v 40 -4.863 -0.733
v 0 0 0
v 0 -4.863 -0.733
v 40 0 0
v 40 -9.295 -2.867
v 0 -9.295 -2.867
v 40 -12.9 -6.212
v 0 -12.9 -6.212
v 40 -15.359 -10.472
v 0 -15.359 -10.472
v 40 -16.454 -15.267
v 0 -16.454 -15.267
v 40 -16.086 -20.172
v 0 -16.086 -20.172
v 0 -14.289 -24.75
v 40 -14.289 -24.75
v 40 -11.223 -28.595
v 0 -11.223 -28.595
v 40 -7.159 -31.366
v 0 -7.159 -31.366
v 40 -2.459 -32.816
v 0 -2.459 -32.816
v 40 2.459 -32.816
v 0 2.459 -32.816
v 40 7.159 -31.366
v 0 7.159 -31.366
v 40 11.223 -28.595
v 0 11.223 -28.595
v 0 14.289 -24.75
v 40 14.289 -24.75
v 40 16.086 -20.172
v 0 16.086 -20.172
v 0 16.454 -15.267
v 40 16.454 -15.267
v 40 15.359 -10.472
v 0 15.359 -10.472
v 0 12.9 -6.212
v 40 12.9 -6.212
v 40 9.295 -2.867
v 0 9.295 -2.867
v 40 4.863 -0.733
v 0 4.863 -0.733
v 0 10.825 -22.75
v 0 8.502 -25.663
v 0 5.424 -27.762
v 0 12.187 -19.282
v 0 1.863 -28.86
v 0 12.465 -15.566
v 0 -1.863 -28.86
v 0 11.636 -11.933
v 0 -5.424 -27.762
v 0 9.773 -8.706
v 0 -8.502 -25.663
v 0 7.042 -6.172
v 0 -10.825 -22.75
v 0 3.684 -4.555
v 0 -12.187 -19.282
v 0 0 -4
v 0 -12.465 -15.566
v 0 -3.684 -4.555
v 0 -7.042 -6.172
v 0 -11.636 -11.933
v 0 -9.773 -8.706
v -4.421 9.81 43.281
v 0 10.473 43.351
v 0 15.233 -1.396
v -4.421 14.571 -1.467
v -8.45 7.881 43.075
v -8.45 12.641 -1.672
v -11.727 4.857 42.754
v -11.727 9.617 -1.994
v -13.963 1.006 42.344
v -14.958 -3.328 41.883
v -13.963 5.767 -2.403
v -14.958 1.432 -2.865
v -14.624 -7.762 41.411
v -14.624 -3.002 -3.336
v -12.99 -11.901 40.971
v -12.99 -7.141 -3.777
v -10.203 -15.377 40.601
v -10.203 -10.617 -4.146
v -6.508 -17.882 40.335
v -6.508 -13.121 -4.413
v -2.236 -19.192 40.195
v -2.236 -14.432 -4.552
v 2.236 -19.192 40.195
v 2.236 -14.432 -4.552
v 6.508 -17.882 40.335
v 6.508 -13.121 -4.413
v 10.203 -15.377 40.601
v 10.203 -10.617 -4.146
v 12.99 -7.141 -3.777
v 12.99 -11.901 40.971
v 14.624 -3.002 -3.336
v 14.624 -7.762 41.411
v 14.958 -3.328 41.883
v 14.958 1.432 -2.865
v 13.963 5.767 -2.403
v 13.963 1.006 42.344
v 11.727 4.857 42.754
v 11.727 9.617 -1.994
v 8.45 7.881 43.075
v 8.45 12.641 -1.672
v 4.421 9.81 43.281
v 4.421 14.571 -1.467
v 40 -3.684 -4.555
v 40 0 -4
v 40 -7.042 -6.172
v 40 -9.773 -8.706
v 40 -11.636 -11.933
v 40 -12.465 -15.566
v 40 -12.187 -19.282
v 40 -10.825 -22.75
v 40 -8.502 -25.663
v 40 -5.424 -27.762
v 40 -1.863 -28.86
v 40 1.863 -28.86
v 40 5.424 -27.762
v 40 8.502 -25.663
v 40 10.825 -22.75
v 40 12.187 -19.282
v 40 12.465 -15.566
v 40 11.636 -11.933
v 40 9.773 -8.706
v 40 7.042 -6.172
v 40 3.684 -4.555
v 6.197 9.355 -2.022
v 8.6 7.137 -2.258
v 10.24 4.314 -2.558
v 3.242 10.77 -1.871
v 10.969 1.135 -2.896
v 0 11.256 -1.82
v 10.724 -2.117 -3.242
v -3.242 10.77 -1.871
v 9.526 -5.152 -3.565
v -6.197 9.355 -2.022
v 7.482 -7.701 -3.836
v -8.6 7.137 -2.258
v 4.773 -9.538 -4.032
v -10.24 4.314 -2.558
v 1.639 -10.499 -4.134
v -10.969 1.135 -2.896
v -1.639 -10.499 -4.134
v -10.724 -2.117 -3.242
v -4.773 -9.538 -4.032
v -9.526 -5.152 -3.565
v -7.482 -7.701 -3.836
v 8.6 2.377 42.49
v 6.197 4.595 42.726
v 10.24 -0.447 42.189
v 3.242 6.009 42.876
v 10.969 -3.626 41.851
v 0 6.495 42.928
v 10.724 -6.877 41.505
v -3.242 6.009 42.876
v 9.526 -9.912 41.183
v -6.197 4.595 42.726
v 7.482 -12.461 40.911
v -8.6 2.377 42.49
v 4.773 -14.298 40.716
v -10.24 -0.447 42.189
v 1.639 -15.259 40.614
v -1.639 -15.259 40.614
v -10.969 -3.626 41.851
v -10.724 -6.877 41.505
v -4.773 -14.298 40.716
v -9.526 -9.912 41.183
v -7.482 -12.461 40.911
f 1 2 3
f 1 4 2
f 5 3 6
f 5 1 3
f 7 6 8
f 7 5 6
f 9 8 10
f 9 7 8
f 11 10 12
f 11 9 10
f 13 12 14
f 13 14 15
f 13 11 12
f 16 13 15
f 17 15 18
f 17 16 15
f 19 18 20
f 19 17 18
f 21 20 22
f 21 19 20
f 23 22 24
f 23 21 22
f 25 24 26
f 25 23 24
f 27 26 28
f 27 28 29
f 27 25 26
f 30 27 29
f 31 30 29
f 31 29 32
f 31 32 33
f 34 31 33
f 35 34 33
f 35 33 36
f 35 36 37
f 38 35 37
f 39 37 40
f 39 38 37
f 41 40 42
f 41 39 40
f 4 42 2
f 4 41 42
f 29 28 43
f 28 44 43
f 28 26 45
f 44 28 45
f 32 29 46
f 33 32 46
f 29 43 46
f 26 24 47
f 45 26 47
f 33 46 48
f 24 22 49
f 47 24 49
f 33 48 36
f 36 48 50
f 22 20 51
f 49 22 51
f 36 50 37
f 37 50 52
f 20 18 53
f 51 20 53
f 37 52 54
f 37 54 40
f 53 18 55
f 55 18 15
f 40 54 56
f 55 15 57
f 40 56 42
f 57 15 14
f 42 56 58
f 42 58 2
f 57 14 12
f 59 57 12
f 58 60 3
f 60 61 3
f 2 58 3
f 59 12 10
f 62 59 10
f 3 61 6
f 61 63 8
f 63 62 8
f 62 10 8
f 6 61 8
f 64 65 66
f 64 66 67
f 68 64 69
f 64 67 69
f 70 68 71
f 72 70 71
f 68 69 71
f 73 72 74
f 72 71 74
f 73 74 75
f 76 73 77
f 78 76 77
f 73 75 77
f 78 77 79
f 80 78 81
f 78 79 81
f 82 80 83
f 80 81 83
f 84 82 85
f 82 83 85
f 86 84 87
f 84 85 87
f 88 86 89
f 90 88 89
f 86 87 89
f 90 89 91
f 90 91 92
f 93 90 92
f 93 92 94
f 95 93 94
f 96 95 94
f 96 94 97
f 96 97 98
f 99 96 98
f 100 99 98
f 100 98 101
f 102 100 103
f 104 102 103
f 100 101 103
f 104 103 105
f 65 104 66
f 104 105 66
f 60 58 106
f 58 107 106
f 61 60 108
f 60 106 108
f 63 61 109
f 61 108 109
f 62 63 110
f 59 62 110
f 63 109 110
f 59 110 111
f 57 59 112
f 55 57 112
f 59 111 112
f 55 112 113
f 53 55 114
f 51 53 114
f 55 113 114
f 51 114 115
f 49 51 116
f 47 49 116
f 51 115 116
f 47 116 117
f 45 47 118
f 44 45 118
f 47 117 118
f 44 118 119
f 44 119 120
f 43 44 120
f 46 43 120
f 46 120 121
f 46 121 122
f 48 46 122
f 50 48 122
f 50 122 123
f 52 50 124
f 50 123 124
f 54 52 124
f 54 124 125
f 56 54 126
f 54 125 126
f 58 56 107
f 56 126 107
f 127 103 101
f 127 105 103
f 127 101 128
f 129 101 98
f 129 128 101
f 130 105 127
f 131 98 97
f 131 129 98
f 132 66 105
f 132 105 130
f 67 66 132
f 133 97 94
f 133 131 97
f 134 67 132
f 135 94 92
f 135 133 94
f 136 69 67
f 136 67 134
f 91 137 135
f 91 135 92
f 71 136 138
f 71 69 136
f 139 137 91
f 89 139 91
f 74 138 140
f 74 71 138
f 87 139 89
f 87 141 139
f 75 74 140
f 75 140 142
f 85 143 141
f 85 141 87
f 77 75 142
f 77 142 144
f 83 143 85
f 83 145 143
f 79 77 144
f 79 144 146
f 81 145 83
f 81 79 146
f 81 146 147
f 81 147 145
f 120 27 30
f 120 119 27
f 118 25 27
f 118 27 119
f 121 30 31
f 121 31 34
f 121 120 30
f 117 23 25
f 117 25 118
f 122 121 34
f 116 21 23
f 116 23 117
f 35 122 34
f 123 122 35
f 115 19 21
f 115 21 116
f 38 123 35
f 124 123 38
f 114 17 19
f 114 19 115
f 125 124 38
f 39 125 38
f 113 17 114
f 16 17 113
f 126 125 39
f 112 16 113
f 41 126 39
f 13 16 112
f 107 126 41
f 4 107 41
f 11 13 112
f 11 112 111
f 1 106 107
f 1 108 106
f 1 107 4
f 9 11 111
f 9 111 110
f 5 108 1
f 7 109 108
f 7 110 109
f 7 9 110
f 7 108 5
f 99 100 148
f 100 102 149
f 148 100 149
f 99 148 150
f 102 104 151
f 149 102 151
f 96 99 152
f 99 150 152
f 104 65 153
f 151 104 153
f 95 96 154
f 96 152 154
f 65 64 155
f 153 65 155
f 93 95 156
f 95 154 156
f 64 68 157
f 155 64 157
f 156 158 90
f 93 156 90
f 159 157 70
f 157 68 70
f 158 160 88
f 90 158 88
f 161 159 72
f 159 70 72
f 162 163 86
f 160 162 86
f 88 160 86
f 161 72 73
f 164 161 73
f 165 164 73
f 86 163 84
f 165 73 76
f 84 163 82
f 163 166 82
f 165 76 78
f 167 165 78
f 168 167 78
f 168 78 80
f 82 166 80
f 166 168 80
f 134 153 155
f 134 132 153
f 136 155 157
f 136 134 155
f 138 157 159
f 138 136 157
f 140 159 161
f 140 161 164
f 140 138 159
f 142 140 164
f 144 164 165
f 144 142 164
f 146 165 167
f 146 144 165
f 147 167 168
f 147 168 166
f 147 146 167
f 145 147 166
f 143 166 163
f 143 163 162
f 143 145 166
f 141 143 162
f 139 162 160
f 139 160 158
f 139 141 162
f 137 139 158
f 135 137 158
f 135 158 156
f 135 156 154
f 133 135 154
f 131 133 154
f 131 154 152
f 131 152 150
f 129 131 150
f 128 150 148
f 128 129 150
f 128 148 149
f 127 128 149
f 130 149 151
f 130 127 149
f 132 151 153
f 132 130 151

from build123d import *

# Parameters (mm, degrees)
SKETCH4_W = 4
SKETCH4_H = 45
SKETCH5_W = 40
SKETCH5_H = 4


with BuildPart() as part:
    # Sketch4 → Revolve1 (revolve)
    with BuildSketch(Plane(origin=(0, 0, 0), x_dir=(1, 0, 0), z_dir=(0, 0.9943889131791124, 0.10578605459352264)), mode=Mode.PRIVATE) as revolve1_sk:
        with Locations((13, -19.5)):
            Rectangle(SKETCH4_W, SKETCH4_H)
    revolve(revolve1_sk.sketch.rotate(Axis((0, 0, 0), (0, -0.10578605459352264, 0.9943889131791124)), 90), axis=Axis((0, 0, 0), (0, -0.10578605459352264, 0.9943889131791124)))


with BuildPart() as body_2:
    # Sketch5 → Revolve2 (revolve)
    with BuildSketch(Plane(origin=(0, 0, 0), x_dir=(1, 0, 0), z_dir=(0, 1, 0))):
        with Locations((20, 2)):
            Rectangle(SKETCH5_W, SKETCH5_H)
    revolve(axis=Axis((0, 0, -16.5), (1, 0, 0)))


solid = Compound([part.part, body_2.part])
